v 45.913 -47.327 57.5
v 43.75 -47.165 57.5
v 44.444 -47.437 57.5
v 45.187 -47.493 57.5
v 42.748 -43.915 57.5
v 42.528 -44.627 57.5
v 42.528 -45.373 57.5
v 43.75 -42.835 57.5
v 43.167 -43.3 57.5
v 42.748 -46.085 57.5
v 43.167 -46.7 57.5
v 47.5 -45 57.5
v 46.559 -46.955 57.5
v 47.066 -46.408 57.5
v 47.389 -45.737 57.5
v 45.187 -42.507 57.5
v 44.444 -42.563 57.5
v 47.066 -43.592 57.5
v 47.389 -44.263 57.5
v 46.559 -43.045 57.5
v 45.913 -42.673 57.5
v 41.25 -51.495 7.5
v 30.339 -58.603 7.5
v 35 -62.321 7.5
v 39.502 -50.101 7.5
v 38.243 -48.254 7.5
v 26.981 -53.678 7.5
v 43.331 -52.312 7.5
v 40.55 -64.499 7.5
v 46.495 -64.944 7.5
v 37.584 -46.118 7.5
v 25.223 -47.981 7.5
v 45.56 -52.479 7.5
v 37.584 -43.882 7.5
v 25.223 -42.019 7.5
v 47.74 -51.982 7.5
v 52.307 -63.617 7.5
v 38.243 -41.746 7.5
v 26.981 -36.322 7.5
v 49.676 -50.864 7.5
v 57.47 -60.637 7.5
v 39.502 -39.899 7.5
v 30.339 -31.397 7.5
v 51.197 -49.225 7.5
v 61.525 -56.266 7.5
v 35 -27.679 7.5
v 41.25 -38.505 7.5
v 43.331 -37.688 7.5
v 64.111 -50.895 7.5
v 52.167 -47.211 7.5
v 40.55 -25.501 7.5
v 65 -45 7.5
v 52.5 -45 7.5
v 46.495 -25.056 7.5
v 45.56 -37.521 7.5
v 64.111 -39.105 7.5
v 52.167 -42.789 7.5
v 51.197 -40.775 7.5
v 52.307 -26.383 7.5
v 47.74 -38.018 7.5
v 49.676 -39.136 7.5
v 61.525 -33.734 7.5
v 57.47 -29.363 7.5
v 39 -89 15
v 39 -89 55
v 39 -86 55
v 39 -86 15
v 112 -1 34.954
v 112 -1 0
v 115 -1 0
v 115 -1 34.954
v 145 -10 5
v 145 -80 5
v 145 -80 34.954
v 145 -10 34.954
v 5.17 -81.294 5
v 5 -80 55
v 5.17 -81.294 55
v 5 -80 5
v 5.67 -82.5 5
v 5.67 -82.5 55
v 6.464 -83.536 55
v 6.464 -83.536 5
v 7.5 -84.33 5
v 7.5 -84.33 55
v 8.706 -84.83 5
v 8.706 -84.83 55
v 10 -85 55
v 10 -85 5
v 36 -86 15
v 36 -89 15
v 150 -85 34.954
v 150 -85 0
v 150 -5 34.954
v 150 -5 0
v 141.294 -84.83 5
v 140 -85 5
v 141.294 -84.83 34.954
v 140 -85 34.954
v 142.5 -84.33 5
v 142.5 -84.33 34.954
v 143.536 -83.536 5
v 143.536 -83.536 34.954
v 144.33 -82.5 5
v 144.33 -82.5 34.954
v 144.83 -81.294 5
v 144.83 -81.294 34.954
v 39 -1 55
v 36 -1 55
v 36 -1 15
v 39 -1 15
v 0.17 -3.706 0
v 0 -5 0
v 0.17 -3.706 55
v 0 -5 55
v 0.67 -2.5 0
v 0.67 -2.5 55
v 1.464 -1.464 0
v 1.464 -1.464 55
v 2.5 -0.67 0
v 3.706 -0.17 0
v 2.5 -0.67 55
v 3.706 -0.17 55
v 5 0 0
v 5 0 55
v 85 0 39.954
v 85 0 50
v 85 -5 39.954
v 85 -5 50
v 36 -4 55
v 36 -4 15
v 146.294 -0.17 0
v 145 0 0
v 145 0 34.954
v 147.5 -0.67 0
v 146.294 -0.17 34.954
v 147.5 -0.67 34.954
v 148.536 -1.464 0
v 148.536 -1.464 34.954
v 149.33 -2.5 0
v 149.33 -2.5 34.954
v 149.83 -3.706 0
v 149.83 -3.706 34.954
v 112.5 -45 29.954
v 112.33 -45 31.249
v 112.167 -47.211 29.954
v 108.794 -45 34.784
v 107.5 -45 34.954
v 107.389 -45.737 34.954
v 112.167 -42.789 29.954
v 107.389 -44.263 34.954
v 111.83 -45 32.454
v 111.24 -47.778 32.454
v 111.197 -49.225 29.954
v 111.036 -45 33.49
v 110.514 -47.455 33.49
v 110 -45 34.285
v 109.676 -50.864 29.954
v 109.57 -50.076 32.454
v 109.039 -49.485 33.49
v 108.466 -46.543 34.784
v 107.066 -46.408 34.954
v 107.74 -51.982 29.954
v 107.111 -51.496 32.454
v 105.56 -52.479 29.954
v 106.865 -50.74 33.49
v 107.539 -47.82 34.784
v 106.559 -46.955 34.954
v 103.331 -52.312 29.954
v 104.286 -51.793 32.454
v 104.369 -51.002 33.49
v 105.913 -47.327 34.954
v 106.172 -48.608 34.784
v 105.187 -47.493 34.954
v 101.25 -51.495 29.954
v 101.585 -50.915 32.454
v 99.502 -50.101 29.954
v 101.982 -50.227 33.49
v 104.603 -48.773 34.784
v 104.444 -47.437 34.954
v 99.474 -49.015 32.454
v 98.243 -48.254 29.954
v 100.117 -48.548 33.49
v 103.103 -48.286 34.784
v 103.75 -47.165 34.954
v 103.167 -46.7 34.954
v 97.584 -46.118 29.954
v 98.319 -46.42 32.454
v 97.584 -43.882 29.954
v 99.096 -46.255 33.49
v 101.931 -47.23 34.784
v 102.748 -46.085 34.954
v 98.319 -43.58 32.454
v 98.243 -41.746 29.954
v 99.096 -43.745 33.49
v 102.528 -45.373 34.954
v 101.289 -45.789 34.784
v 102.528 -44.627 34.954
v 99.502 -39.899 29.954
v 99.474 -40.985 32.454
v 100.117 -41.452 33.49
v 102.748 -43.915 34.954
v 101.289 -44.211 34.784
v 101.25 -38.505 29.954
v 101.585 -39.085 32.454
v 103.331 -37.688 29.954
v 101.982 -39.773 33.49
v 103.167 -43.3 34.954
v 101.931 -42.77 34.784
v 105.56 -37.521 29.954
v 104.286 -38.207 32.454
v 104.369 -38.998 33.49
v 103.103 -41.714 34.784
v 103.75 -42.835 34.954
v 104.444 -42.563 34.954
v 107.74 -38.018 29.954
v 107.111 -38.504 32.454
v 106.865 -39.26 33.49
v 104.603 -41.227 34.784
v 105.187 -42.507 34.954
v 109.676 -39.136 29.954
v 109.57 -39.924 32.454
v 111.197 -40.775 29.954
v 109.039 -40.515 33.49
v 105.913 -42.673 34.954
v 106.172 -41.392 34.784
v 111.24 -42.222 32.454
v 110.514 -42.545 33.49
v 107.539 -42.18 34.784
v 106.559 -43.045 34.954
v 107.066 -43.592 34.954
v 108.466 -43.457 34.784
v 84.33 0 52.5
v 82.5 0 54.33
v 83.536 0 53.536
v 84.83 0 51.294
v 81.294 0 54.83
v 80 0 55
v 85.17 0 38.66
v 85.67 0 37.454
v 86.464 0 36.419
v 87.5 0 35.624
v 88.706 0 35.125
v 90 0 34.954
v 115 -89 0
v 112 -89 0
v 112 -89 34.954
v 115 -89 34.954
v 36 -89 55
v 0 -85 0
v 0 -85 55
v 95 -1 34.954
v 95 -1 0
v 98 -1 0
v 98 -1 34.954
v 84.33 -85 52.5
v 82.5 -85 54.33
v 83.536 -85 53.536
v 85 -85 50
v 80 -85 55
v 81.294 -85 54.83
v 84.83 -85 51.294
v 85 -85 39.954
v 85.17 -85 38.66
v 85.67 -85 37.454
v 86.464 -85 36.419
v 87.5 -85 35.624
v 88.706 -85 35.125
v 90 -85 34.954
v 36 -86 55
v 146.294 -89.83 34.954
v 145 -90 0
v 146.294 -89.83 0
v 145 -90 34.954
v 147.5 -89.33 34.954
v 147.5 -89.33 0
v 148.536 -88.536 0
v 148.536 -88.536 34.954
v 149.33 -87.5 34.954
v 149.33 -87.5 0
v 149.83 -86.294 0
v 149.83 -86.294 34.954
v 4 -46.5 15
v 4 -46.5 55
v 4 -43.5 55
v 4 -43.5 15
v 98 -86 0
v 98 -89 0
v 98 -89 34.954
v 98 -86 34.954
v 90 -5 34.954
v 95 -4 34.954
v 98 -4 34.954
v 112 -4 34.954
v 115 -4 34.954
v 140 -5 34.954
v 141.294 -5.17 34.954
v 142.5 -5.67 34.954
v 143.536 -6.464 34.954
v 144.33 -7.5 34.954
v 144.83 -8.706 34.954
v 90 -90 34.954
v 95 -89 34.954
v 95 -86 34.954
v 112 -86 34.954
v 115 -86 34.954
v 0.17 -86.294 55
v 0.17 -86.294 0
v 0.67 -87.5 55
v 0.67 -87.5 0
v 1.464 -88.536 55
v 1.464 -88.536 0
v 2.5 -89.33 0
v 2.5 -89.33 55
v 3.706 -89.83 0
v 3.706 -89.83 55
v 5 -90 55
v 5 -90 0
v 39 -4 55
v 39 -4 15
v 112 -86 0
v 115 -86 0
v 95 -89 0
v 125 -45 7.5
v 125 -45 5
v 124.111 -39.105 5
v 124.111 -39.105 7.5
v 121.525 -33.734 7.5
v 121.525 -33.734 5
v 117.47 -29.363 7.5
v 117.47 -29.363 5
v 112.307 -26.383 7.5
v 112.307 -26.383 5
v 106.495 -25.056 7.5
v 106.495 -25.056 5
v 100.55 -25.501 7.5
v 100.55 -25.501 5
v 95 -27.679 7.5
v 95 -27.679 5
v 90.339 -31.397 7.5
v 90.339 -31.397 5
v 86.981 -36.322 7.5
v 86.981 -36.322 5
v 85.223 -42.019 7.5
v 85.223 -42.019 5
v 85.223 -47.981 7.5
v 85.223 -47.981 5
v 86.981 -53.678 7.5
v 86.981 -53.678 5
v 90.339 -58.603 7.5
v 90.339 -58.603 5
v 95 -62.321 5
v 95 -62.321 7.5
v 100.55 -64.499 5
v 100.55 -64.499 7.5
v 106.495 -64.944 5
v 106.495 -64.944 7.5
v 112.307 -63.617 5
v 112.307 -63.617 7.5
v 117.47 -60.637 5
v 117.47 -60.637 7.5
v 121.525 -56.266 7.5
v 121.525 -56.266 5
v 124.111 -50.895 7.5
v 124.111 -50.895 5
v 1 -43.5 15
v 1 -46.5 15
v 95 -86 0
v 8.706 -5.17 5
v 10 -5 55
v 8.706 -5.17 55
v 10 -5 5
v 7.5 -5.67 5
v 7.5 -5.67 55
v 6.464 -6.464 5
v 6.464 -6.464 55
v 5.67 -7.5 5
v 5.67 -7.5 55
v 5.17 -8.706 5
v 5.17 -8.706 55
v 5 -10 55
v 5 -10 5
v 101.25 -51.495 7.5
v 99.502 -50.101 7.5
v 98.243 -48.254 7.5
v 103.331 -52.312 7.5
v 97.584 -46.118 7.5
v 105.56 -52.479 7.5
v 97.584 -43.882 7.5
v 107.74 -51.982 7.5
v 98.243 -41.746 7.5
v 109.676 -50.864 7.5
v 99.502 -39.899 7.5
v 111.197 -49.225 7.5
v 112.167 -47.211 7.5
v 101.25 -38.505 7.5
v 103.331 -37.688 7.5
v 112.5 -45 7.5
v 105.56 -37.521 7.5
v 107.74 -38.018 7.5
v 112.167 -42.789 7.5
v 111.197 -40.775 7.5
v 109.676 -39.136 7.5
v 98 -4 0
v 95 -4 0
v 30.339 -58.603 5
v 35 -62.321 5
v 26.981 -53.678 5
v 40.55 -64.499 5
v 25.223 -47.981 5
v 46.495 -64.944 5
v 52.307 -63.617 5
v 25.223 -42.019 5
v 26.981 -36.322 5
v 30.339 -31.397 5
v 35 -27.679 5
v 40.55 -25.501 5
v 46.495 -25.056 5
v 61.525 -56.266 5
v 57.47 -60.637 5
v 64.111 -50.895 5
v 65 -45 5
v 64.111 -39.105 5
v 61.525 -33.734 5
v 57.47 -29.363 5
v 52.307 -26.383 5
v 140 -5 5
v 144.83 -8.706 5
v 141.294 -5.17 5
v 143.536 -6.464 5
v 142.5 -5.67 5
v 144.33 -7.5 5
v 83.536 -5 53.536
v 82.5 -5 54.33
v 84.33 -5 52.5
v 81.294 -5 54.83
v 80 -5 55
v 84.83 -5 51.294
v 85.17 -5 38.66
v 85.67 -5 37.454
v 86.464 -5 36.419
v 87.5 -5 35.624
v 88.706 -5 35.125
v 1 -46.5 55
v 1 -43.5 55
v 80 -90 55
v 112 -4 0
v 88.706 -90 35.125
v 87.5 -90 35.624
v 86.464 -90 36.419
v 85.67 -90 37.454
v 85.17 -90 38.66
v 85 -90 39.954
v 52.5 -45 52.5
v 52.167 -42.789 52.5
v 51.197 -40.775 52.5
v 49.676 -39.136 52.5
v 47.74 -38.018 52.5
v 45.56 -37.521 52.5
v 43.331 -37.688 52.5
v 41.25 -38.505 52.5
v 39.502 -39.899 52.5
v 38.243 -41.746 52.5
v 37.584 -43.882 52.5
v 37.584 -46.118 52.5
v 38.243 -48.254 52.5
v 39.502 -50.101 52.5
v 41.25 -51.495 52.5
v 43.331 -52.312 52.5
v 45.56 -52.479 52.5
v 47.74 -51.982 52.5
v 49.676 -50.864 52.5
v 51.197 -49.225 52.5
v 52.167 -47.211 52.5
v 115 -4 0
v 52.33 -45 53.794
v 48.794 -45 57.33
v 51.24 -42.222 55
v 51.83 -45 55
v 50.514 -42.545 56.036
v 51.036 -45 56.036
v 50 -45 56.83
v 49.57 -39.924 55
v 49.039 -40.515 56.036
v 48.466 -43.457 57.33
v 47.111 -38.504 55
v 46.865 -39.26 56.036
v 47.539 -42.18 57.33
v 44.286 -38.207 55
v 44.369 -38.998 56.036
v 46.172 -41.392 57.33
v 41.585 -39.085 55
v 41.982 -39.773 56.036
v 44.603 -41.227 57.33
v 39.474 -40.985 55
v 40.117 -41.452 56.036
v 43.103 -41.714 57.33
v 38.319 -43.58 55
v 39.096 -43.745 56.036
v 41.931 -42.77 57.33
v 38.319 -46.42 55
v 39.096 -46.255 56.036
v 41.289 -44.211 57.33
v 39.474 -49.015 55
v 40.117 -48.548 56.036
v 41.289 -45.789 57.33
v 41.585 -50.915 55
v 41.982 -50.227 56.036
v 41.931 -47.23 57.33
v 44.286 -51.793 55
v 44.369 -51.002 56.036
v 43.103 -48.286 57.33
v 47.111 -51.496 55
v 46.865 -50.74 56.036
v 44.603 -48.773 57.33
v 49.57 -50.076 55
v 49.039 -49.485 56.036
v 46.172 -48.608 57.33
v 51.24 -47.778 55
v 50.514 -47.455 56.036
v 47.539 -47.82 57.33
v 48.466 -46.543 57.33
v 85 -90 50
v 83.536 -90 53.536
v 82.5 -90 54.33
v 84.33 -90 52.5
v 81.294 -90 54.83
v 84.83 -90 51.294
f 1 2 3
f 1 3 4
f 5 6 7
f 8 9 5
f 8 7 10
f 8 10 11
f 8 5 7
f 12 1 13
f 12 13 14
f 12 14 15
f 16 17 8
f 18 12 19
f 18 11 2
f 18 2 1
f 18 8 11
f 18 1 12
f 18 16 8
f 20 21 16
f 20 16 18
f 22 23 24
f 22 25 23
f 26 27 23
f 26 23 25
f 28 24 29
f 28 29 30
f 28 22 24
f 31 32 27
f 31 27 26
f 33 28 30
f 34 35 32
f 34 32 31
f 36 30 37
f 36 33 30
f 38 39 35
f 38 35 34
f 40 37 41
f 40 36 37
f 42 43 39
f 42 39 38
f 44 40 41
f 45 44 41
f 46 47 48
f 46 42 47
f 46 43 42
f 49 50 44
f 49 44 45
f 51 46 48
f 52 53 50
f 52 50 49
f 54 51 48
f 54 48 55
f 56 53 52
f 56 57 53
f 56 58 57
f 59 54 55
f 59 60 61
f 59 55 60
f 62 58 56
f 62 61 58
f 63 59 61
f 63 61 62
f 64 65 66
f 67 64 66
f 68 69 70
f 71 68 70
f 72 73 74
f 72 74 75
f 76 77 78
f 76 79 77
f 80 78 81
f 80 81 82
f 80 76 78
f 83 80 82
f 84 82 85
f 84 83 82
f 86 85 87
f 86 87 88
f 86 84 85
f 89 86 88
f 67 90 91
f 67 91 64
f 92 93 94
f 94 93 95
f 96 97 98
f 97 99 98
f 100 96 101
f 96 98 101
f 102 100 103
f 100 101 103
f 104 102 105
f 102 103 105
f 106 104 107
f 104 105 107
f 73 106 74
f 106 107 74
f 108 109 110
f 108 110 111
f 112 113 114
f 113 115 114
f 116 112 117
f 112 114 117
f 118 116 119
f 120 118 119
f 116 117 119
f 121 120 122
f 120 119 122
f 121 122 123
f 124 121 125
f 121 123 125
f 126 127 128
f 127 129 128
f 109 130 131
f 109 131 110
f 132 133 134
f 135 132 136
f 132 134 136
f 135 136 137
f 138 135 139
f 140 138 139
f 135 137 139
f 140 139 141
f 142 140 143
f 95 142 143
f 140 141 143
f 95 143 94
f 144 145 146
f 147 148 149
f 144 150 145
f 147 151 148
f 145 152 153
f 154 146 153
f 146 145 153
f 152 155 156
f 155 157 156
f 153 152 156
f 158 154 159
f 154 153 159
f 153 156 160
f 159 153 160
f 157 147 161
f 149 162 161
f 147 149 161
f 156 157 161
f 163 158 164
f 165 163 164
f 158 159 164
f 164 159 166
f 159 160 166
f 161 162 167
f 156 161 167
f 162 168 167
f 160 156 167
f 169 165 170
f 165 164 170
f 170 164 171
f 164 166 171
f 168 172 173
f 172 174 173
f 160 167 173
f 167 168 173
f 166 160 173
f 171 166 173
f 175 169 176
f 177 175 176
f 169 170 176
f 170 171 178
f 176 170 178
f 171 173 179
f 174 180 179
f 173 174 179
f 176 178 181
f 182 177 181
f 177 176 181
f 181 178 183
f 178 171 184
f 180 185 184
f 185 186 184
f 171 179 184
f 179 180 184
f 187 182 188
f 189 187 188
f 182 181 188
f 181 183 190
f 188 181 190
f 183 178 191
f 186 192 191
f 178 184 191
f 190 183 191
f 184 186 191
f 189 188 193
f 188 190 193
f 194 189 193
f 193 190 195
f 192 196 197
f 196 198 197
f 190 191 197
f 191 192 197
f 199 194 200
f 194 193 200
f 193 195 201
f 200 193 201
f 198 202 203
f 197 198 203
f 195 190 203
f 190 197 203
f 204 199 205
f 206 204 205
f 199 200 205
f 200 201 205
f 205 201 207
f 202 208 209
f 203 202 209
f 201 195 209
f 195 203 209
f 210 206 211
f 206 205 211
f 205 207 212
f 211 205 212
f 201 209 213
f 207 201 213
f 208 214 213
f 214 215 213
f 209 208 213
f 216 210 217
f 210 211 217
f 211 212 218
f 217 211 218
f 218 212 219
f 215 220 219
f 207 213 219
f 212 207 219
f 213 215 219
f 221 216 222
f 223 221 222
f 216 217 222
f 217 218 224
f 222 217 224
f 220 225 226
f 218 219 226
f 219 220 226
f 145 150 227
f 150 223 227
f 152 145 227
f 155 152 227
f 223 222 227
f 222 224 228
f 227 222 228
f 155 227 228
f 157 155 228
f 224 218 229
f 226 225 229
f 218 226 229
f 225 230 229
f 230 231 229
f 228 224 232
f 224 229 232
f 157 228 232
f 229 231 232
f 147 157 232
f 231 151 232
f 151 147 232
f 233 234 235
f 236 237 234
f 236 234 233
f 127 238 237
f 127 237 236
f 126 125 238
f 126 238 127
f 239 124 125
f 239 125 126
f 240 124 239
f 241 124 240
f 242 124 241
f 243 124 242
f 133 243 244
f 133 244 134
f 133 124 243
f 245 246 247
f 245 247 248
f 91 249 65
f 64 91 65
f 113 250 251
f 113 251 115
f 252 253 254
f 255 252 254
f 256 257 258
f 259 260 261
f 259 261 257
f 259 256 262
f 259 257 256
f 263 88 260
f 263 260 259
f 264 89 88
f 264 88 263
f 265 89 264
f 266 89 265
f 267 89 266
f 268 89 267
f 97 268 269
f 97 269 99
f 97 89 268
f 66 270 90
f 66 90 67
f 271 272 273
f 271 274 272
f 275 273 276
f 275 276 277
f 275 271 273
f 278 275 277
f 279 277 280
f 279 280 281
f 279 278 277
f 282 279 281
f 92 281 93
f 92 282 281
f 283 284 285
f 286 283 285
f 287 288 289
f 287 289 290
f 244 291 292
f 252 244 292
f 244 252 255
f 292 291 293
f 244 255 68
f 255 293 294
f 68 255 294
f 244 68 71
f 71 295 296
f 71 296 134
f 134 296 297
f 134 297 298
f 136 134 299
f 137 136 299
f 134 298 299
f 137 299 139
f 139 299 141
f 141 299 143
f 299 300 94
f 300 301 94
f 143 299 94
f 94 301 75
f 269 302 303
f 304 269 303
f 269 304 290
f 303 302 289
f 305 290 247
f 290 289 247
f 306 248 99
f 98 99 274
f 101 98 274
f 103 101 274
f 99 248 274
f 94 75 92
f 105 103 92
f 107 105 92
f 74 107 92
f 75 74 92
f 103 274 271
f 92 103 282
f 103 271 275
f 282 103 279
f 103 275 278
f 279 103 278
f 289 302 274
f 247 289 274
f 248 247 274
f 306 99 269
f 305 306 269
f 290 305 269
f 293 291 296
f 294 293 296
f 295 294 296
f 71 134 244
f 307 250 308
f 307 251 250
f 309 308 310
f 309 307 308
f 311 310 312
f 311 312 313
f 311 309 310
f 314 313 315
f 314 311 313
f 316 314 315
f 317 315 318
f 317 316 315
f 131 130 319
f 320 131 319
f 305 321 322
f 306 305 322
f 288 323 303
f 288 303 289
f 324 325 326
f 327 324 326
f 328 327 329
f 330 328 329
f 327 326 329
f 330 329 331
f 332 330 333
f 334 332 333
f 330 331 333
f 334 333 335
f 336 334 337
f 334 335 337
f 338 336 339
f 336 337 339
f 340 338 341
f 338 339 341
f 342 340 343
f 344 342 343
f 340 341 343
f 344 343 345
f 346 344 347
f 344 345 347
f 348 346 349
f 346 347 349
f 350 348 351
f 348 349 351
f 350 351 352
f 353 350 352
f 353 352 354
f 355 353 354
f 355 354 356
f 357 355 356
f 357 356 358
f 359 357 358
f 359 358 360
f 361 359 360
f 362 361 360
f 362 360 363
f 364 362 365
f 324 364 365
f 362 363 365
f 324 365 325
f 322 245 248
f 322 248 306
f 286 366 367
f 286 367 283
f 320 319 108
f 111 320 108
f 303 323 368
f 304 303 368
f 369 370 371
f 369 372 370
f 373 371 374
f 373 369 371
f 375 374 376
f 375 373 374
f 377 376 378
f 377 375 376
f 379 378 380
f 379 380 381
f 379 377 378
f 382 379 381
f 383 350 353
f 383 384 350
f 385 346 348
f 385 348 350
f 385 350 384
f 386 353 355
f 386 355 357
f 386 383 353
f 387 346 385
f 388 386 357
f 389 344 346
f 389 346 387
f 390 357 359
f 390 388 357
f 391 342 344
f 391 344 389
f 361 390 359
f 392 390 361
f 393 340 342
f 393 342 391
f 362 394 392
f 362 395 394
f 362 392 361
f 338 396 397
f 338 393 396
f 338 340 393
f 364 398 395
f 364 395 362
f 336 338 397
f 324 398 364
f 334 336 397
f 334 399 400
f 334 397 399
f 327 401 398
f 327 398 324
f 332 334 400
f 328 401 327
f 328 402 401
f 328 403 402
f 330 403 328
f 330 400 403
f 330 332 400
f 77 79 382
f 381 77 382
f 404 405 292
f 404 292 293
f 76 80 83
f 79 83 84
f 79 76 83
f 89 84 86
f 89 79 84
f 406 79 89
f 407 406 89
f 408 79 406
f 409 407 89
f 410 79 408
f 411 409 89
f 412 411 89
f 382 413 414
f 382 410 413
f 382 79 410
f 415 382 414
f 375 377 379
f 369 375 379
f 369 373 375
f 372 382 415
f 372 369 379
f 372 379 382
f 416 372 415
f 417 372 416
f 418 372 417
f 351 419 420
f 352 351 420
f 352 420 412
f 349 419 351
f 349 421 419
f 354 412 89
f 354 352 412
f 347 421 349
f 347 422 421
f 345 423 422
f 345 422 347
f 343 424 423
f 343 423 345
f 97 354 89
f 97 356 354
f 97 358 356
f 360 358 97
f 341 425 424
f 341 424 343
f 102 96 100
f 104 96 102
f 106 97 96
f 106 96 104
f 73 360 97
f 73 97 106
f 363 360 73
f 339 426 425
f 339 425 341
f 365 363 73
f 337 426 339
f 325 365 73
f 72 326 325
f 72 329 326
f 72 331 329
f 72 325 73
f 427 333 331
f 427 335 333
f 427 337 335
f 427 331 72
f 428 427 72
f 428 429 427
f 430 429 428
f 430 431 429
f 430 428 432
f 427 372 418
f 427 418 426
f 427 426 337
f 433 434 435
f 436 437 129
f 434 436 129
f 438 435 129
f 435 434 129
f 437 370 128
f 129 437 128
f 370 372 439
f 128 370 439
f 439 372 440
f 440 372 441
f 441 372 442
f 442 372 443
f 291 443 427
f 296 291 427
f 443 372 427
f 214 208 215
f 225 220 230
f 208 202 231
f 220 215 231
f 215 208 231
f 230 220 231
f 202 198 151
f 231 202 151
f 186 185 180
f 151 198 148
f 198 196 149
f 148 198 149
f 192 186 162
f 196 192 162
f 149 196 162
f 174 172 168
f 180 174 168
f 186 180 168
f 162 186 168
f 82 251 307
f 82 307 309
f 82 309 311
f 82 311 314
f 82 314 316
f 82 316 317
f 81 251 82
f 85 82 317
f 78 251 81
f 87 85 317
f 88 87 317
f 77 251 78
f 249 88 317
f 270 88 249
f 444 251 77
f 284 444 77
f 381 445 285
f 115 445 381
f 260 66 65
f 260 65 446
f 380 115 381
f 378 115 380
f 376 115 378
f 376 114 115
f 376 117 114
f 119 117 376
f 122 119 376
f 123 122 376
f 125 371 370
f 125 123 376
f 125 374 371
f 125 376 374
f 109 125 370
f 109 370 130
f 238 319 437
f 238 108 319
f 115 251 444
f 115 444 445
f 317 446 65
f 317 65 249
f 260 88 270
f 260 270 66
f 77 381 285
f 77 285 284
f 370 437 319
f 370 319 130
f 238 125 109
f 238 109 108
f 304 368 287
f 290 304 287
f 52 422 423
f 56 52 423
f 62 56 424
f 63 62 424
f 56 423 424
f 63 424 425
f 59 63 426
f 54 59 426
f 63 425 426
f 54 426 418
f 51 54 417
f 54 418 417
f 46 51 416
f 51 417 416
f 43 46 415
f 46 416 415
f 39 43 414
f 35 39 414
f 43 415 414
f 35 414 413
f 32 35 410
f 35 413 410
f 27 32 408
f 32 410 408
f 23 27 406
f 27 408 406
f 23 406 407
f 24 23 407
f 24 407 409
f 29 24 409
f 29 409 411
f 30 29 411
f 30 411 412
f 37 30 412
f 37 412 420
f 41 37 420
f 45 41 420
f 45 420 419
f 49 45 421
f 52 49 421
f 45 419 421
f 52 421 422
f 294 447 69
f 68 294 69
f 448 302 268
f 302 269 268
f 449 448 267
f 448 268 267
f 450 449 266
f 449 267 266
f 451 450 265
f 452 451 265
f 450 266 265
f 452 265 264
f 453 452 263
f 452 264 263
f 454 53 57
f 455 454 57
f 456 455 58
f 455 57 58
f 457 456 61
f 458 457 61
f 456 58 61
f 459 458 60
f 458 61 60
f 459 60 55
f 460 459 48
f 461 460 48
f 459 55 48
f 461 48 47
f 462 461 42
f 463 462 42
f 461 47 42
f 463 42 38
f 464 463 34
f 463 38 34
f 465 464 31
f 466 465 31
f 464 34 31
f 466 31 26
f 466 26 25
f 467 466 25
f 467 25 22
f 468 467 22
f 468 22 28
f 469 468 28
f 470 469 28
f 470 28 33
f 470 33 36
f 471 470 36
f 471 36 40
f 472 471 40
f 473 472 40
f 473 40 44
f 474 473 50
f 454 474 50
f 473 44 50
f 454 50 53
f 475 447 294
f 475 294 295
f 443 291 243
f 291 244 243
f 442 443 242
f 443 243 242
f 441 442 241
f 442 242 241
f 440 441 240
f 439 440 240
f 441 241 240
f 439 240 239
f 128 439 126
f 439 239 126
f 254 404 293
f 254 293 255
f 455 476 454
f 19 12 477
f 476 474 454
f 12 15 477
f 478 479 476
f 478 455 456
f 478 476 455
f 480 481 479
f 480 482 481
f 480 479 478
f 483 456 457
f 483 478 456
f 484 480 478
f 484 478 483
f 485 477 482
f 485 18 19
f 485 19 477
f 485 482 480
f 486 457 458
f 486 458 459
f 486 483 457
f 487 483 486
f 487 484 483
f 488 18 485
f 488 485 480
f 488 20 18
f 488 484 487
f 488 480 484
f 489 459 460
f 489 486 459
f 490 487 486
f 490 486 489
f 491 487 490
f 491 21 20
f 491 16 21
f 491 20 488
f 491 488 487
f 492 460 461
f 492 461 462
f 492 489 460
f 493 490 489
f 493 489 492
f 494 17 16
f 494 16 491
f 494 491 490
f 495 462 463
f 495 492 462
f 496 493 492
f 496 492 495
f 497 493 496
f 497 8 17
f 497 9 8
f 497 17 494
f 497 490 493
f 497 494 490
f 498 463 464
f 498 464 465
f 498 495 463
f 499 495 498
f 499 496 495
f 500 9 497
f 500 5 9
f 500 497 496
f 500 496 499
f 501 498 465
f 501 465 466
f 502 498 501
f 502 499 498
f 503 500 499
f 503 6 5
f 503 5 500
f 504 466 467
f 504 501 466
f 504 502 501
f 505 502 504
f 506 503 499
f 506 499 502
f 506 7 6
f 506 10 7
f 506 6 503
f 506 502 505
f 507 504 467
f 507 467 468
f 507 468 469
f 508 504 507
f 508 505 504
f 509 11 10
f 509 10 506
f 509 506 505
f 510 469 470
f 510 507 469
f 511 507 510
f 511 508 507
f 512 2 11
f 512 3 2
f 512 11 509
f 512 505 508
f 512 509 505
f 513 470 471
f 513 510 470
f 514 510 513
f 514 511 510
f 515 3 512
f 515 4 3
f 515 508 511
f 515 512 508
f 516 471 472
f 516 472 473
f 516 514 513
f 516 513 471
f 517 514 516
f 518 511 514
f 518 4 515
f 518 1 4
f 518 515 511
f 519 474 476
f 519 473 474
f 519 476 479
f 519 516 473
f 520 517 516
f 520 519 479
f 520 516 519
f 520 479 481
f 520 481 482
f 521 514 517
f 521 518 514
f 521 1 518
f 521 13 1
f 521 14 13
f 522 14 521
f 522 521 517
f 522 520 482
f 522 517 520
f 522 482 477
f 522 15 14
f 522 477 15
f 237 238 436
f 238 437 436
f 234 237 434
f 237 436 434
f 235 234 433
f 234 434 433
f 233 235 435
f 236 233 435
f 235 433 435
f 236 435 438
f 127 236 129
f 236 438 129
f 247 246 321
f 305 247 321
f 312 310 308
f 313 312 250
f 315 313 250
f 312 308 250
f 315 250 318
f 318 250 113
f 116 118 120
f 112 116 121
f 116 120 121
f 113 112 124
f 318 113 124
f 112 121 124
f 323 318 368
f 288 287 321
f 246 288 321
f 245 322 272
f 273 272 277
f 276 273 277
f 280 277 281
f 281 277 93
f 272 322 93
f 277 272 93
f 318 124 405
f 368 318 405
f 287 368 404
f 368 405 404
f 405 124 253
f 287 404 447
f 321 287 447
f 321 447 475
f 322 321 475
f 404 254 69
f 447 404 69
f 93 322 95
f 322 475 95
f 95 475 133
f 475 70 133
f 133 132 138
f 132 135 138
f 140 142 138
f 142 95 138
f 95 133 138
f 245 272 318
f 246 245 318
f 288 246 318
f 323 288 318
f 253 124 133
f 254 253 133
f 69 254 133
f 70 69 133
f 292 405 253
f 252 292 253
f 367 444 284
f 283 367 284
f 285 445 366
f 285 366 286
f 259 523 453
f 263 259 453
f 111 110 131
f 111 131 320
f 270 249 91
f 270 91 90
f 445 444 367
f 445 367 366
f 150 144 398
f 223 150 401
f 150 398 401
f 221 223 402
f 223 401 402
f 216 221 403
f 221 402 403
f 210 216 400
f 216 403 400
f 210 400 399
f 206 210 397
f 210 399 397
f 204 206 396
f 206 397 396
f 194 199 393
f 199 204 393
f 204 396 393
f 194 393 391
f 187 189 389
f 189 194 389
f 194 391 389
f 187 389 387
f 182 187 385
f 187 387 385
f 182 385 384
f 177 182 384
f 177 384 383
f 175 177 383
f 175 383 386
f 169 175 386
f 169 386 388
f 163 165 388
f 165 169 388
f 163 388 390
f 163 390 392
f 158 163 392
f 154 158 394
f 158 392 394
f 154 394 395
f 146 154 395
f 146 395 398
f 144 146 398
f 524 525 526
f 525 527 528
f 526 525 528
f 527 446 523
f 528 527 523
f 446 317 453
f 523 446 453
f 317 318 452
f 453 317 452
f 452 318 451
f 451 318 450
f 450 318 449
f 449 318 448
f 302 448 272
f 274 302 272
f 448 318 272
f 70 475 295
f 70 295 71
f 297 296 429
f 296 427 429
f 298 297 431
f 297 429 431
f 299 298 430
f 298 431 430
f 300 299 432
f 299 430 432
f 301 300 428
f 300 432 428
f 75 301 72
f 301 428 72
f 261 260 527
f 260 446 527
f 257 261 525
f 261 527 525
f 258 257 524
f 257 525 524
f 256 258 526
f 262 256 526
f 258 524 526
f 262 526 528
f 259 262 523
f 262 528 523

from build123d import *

# Parameters (mm, degrees)
SKETCH1_W           = 150
SKETCH1_H           = 90
BOSS_EXTRUDE1_DEPTH = 55
SHELL4_T            = -5
SKETCH2_R           = 20
BOSS_EXTRUDE2_DEPTH = 2.5
SKETCH3_R           = 7.5
BOSS_EXTRUDE3_DEPTH = 50
SKETCH4_W           = 65
SKETCH4_H           = 19.658499389
CUT_EXTRUDE1_DEPTH  = 185.136498283
SKETCH6_W           = 3
SKETCH6_H           = 3
CUT_EXTRUDE3_DEPTH  = 40
FILLET4_R           = 5
FILLET5_R           = 5
SKETCH10_W          = 3
SKETCH10_H          = 3
CUT_EXTRUDE4_DEPTH  = 40


with BuildPart() as part:
    # Sketch1 → Boss-Extrude1 (new body)
    with BuildSketch(Plane.XY):
        with Locations((75, -45)):
            Rectangle(SKETCH1_W, SKETCH1_H)
    extrude(amount=BOSS_EXTRUDE1_DEPTH)

    # Shell4
    shell4_openings = [part.faces().sort_by_distance(p)[0] for p in [
        (75, -45, 55),
    ]]
    offset(amount=SHELL4_T, openings=shell4_openings, kind=Kind.INTERSECTION)

    # Sketch2 → Boss-Extrude2 (add)
    with BuildSketch(Plane.XY.offset(5)):
        with Locations((45, -45)):
            Circle(SKETCH2_R)
        with Locations((105, -45)):
            Circle(SKETCH2_R)
    extrude(amount=BOSS_EXTRUDE2_DEPTH)

    # Sketch3 → Boss-Extrude3 (add)
    with BuildSketch(Plane.XY.offset(7.5)):
        with Locations((45, -45)):
            Circle(SKETCH3_R)
        with Locations((105, -45)):
            Circle(SKETCH3_R)
    extrude(amount=BOSS_EXTRUDE3_DEPTH)

    # Sketch4 → Cut-Extrude1 (cut, through all)
    with BuildSketch(Plane.XZ.offset(90)):
        Polygon((85, 55), (85, 49.954434269), (85, 34.954434269), (150, 34.954434269), (150, 55), align=None)
        with Locations((117.5, 64.829249694)):
            Rectangle(SKETCH4_W, SKETCH4_H)
    extrude(amount=-CUT_EXTRUDE1_DEPTH, mode=Mode.SUBTRACT)

    # Sketch6 → Cut-Extrude3 (cut)
    with BuildSketch(Plane.XY.offset(34.954434269)):
        with Locations((96.5, -2.5)):
            Rectangle(SKETCH6_W, SKETCH6_H)
        with Locations((113.5, -2.5)):
            Rectangle(SKETCH6_W, SKETCH6_H)
        with Locations((96.5, -87.5)):
            Rectangle(SKETCH6_W, SKETCH6_H)
        with Locations((113.5, -87.5)):
            Rectangle(SKETCH6_W, SKETCH6_H)
    extrude(amount=-CUT_EXTRUDE3_DEPTH, mode=Mode.SUBTRACT)

    # Fillet4
    fillet4_edges = [part.edges().sort_by_distance(p)[0] for p in [
        (5, -5, 30),
        (5, -85, 30),
        (145, -5, 19.977217134),
        (145, -85, 19.977217134),
        (150, 0, 17.477217134),
        (150, -90, 17.477217134),
        (85, -87.5, 55),
        (85, -87.5, 34.954434269),
        (85, -2.5, 55),
        (85, -2.5, 34.954434269),
        (0, 0, 27.5),
        (0, -90, 27.5),
    ]]
    fillet(fillet4_edges, radius=FILLET4_R)

    # Fillet5
    fillet5_edges = [part.edges().sort_by_distance(p)[0] for p in [
        (37.5, -45, 57.5),
        (97.5, -45, 34.954434269),
    ]]
    fillet(fillet5_edges, radius=FILLET5_R)

    # Sketch10 → Cut-Extrude4 (cut)
    with BuildSketch(Plane.XY.offset(55)):
        with Locations((2.5, -45)):
            Rectangle(SKETCH10_W, SKETCH10_H)
        with Locations((37.5, -87.5)):
            Rectangle(SKETCH10_W, SKETCH10_H)
        with Locations((37.5, -2.5)):
            Rectangle(SKETCH10_W, SKETCH10_H)
    extrude(amount=-CUT_EXTRUDE4_DEPTH, mode=Mode.SUBTRACT)


solid = part.part
